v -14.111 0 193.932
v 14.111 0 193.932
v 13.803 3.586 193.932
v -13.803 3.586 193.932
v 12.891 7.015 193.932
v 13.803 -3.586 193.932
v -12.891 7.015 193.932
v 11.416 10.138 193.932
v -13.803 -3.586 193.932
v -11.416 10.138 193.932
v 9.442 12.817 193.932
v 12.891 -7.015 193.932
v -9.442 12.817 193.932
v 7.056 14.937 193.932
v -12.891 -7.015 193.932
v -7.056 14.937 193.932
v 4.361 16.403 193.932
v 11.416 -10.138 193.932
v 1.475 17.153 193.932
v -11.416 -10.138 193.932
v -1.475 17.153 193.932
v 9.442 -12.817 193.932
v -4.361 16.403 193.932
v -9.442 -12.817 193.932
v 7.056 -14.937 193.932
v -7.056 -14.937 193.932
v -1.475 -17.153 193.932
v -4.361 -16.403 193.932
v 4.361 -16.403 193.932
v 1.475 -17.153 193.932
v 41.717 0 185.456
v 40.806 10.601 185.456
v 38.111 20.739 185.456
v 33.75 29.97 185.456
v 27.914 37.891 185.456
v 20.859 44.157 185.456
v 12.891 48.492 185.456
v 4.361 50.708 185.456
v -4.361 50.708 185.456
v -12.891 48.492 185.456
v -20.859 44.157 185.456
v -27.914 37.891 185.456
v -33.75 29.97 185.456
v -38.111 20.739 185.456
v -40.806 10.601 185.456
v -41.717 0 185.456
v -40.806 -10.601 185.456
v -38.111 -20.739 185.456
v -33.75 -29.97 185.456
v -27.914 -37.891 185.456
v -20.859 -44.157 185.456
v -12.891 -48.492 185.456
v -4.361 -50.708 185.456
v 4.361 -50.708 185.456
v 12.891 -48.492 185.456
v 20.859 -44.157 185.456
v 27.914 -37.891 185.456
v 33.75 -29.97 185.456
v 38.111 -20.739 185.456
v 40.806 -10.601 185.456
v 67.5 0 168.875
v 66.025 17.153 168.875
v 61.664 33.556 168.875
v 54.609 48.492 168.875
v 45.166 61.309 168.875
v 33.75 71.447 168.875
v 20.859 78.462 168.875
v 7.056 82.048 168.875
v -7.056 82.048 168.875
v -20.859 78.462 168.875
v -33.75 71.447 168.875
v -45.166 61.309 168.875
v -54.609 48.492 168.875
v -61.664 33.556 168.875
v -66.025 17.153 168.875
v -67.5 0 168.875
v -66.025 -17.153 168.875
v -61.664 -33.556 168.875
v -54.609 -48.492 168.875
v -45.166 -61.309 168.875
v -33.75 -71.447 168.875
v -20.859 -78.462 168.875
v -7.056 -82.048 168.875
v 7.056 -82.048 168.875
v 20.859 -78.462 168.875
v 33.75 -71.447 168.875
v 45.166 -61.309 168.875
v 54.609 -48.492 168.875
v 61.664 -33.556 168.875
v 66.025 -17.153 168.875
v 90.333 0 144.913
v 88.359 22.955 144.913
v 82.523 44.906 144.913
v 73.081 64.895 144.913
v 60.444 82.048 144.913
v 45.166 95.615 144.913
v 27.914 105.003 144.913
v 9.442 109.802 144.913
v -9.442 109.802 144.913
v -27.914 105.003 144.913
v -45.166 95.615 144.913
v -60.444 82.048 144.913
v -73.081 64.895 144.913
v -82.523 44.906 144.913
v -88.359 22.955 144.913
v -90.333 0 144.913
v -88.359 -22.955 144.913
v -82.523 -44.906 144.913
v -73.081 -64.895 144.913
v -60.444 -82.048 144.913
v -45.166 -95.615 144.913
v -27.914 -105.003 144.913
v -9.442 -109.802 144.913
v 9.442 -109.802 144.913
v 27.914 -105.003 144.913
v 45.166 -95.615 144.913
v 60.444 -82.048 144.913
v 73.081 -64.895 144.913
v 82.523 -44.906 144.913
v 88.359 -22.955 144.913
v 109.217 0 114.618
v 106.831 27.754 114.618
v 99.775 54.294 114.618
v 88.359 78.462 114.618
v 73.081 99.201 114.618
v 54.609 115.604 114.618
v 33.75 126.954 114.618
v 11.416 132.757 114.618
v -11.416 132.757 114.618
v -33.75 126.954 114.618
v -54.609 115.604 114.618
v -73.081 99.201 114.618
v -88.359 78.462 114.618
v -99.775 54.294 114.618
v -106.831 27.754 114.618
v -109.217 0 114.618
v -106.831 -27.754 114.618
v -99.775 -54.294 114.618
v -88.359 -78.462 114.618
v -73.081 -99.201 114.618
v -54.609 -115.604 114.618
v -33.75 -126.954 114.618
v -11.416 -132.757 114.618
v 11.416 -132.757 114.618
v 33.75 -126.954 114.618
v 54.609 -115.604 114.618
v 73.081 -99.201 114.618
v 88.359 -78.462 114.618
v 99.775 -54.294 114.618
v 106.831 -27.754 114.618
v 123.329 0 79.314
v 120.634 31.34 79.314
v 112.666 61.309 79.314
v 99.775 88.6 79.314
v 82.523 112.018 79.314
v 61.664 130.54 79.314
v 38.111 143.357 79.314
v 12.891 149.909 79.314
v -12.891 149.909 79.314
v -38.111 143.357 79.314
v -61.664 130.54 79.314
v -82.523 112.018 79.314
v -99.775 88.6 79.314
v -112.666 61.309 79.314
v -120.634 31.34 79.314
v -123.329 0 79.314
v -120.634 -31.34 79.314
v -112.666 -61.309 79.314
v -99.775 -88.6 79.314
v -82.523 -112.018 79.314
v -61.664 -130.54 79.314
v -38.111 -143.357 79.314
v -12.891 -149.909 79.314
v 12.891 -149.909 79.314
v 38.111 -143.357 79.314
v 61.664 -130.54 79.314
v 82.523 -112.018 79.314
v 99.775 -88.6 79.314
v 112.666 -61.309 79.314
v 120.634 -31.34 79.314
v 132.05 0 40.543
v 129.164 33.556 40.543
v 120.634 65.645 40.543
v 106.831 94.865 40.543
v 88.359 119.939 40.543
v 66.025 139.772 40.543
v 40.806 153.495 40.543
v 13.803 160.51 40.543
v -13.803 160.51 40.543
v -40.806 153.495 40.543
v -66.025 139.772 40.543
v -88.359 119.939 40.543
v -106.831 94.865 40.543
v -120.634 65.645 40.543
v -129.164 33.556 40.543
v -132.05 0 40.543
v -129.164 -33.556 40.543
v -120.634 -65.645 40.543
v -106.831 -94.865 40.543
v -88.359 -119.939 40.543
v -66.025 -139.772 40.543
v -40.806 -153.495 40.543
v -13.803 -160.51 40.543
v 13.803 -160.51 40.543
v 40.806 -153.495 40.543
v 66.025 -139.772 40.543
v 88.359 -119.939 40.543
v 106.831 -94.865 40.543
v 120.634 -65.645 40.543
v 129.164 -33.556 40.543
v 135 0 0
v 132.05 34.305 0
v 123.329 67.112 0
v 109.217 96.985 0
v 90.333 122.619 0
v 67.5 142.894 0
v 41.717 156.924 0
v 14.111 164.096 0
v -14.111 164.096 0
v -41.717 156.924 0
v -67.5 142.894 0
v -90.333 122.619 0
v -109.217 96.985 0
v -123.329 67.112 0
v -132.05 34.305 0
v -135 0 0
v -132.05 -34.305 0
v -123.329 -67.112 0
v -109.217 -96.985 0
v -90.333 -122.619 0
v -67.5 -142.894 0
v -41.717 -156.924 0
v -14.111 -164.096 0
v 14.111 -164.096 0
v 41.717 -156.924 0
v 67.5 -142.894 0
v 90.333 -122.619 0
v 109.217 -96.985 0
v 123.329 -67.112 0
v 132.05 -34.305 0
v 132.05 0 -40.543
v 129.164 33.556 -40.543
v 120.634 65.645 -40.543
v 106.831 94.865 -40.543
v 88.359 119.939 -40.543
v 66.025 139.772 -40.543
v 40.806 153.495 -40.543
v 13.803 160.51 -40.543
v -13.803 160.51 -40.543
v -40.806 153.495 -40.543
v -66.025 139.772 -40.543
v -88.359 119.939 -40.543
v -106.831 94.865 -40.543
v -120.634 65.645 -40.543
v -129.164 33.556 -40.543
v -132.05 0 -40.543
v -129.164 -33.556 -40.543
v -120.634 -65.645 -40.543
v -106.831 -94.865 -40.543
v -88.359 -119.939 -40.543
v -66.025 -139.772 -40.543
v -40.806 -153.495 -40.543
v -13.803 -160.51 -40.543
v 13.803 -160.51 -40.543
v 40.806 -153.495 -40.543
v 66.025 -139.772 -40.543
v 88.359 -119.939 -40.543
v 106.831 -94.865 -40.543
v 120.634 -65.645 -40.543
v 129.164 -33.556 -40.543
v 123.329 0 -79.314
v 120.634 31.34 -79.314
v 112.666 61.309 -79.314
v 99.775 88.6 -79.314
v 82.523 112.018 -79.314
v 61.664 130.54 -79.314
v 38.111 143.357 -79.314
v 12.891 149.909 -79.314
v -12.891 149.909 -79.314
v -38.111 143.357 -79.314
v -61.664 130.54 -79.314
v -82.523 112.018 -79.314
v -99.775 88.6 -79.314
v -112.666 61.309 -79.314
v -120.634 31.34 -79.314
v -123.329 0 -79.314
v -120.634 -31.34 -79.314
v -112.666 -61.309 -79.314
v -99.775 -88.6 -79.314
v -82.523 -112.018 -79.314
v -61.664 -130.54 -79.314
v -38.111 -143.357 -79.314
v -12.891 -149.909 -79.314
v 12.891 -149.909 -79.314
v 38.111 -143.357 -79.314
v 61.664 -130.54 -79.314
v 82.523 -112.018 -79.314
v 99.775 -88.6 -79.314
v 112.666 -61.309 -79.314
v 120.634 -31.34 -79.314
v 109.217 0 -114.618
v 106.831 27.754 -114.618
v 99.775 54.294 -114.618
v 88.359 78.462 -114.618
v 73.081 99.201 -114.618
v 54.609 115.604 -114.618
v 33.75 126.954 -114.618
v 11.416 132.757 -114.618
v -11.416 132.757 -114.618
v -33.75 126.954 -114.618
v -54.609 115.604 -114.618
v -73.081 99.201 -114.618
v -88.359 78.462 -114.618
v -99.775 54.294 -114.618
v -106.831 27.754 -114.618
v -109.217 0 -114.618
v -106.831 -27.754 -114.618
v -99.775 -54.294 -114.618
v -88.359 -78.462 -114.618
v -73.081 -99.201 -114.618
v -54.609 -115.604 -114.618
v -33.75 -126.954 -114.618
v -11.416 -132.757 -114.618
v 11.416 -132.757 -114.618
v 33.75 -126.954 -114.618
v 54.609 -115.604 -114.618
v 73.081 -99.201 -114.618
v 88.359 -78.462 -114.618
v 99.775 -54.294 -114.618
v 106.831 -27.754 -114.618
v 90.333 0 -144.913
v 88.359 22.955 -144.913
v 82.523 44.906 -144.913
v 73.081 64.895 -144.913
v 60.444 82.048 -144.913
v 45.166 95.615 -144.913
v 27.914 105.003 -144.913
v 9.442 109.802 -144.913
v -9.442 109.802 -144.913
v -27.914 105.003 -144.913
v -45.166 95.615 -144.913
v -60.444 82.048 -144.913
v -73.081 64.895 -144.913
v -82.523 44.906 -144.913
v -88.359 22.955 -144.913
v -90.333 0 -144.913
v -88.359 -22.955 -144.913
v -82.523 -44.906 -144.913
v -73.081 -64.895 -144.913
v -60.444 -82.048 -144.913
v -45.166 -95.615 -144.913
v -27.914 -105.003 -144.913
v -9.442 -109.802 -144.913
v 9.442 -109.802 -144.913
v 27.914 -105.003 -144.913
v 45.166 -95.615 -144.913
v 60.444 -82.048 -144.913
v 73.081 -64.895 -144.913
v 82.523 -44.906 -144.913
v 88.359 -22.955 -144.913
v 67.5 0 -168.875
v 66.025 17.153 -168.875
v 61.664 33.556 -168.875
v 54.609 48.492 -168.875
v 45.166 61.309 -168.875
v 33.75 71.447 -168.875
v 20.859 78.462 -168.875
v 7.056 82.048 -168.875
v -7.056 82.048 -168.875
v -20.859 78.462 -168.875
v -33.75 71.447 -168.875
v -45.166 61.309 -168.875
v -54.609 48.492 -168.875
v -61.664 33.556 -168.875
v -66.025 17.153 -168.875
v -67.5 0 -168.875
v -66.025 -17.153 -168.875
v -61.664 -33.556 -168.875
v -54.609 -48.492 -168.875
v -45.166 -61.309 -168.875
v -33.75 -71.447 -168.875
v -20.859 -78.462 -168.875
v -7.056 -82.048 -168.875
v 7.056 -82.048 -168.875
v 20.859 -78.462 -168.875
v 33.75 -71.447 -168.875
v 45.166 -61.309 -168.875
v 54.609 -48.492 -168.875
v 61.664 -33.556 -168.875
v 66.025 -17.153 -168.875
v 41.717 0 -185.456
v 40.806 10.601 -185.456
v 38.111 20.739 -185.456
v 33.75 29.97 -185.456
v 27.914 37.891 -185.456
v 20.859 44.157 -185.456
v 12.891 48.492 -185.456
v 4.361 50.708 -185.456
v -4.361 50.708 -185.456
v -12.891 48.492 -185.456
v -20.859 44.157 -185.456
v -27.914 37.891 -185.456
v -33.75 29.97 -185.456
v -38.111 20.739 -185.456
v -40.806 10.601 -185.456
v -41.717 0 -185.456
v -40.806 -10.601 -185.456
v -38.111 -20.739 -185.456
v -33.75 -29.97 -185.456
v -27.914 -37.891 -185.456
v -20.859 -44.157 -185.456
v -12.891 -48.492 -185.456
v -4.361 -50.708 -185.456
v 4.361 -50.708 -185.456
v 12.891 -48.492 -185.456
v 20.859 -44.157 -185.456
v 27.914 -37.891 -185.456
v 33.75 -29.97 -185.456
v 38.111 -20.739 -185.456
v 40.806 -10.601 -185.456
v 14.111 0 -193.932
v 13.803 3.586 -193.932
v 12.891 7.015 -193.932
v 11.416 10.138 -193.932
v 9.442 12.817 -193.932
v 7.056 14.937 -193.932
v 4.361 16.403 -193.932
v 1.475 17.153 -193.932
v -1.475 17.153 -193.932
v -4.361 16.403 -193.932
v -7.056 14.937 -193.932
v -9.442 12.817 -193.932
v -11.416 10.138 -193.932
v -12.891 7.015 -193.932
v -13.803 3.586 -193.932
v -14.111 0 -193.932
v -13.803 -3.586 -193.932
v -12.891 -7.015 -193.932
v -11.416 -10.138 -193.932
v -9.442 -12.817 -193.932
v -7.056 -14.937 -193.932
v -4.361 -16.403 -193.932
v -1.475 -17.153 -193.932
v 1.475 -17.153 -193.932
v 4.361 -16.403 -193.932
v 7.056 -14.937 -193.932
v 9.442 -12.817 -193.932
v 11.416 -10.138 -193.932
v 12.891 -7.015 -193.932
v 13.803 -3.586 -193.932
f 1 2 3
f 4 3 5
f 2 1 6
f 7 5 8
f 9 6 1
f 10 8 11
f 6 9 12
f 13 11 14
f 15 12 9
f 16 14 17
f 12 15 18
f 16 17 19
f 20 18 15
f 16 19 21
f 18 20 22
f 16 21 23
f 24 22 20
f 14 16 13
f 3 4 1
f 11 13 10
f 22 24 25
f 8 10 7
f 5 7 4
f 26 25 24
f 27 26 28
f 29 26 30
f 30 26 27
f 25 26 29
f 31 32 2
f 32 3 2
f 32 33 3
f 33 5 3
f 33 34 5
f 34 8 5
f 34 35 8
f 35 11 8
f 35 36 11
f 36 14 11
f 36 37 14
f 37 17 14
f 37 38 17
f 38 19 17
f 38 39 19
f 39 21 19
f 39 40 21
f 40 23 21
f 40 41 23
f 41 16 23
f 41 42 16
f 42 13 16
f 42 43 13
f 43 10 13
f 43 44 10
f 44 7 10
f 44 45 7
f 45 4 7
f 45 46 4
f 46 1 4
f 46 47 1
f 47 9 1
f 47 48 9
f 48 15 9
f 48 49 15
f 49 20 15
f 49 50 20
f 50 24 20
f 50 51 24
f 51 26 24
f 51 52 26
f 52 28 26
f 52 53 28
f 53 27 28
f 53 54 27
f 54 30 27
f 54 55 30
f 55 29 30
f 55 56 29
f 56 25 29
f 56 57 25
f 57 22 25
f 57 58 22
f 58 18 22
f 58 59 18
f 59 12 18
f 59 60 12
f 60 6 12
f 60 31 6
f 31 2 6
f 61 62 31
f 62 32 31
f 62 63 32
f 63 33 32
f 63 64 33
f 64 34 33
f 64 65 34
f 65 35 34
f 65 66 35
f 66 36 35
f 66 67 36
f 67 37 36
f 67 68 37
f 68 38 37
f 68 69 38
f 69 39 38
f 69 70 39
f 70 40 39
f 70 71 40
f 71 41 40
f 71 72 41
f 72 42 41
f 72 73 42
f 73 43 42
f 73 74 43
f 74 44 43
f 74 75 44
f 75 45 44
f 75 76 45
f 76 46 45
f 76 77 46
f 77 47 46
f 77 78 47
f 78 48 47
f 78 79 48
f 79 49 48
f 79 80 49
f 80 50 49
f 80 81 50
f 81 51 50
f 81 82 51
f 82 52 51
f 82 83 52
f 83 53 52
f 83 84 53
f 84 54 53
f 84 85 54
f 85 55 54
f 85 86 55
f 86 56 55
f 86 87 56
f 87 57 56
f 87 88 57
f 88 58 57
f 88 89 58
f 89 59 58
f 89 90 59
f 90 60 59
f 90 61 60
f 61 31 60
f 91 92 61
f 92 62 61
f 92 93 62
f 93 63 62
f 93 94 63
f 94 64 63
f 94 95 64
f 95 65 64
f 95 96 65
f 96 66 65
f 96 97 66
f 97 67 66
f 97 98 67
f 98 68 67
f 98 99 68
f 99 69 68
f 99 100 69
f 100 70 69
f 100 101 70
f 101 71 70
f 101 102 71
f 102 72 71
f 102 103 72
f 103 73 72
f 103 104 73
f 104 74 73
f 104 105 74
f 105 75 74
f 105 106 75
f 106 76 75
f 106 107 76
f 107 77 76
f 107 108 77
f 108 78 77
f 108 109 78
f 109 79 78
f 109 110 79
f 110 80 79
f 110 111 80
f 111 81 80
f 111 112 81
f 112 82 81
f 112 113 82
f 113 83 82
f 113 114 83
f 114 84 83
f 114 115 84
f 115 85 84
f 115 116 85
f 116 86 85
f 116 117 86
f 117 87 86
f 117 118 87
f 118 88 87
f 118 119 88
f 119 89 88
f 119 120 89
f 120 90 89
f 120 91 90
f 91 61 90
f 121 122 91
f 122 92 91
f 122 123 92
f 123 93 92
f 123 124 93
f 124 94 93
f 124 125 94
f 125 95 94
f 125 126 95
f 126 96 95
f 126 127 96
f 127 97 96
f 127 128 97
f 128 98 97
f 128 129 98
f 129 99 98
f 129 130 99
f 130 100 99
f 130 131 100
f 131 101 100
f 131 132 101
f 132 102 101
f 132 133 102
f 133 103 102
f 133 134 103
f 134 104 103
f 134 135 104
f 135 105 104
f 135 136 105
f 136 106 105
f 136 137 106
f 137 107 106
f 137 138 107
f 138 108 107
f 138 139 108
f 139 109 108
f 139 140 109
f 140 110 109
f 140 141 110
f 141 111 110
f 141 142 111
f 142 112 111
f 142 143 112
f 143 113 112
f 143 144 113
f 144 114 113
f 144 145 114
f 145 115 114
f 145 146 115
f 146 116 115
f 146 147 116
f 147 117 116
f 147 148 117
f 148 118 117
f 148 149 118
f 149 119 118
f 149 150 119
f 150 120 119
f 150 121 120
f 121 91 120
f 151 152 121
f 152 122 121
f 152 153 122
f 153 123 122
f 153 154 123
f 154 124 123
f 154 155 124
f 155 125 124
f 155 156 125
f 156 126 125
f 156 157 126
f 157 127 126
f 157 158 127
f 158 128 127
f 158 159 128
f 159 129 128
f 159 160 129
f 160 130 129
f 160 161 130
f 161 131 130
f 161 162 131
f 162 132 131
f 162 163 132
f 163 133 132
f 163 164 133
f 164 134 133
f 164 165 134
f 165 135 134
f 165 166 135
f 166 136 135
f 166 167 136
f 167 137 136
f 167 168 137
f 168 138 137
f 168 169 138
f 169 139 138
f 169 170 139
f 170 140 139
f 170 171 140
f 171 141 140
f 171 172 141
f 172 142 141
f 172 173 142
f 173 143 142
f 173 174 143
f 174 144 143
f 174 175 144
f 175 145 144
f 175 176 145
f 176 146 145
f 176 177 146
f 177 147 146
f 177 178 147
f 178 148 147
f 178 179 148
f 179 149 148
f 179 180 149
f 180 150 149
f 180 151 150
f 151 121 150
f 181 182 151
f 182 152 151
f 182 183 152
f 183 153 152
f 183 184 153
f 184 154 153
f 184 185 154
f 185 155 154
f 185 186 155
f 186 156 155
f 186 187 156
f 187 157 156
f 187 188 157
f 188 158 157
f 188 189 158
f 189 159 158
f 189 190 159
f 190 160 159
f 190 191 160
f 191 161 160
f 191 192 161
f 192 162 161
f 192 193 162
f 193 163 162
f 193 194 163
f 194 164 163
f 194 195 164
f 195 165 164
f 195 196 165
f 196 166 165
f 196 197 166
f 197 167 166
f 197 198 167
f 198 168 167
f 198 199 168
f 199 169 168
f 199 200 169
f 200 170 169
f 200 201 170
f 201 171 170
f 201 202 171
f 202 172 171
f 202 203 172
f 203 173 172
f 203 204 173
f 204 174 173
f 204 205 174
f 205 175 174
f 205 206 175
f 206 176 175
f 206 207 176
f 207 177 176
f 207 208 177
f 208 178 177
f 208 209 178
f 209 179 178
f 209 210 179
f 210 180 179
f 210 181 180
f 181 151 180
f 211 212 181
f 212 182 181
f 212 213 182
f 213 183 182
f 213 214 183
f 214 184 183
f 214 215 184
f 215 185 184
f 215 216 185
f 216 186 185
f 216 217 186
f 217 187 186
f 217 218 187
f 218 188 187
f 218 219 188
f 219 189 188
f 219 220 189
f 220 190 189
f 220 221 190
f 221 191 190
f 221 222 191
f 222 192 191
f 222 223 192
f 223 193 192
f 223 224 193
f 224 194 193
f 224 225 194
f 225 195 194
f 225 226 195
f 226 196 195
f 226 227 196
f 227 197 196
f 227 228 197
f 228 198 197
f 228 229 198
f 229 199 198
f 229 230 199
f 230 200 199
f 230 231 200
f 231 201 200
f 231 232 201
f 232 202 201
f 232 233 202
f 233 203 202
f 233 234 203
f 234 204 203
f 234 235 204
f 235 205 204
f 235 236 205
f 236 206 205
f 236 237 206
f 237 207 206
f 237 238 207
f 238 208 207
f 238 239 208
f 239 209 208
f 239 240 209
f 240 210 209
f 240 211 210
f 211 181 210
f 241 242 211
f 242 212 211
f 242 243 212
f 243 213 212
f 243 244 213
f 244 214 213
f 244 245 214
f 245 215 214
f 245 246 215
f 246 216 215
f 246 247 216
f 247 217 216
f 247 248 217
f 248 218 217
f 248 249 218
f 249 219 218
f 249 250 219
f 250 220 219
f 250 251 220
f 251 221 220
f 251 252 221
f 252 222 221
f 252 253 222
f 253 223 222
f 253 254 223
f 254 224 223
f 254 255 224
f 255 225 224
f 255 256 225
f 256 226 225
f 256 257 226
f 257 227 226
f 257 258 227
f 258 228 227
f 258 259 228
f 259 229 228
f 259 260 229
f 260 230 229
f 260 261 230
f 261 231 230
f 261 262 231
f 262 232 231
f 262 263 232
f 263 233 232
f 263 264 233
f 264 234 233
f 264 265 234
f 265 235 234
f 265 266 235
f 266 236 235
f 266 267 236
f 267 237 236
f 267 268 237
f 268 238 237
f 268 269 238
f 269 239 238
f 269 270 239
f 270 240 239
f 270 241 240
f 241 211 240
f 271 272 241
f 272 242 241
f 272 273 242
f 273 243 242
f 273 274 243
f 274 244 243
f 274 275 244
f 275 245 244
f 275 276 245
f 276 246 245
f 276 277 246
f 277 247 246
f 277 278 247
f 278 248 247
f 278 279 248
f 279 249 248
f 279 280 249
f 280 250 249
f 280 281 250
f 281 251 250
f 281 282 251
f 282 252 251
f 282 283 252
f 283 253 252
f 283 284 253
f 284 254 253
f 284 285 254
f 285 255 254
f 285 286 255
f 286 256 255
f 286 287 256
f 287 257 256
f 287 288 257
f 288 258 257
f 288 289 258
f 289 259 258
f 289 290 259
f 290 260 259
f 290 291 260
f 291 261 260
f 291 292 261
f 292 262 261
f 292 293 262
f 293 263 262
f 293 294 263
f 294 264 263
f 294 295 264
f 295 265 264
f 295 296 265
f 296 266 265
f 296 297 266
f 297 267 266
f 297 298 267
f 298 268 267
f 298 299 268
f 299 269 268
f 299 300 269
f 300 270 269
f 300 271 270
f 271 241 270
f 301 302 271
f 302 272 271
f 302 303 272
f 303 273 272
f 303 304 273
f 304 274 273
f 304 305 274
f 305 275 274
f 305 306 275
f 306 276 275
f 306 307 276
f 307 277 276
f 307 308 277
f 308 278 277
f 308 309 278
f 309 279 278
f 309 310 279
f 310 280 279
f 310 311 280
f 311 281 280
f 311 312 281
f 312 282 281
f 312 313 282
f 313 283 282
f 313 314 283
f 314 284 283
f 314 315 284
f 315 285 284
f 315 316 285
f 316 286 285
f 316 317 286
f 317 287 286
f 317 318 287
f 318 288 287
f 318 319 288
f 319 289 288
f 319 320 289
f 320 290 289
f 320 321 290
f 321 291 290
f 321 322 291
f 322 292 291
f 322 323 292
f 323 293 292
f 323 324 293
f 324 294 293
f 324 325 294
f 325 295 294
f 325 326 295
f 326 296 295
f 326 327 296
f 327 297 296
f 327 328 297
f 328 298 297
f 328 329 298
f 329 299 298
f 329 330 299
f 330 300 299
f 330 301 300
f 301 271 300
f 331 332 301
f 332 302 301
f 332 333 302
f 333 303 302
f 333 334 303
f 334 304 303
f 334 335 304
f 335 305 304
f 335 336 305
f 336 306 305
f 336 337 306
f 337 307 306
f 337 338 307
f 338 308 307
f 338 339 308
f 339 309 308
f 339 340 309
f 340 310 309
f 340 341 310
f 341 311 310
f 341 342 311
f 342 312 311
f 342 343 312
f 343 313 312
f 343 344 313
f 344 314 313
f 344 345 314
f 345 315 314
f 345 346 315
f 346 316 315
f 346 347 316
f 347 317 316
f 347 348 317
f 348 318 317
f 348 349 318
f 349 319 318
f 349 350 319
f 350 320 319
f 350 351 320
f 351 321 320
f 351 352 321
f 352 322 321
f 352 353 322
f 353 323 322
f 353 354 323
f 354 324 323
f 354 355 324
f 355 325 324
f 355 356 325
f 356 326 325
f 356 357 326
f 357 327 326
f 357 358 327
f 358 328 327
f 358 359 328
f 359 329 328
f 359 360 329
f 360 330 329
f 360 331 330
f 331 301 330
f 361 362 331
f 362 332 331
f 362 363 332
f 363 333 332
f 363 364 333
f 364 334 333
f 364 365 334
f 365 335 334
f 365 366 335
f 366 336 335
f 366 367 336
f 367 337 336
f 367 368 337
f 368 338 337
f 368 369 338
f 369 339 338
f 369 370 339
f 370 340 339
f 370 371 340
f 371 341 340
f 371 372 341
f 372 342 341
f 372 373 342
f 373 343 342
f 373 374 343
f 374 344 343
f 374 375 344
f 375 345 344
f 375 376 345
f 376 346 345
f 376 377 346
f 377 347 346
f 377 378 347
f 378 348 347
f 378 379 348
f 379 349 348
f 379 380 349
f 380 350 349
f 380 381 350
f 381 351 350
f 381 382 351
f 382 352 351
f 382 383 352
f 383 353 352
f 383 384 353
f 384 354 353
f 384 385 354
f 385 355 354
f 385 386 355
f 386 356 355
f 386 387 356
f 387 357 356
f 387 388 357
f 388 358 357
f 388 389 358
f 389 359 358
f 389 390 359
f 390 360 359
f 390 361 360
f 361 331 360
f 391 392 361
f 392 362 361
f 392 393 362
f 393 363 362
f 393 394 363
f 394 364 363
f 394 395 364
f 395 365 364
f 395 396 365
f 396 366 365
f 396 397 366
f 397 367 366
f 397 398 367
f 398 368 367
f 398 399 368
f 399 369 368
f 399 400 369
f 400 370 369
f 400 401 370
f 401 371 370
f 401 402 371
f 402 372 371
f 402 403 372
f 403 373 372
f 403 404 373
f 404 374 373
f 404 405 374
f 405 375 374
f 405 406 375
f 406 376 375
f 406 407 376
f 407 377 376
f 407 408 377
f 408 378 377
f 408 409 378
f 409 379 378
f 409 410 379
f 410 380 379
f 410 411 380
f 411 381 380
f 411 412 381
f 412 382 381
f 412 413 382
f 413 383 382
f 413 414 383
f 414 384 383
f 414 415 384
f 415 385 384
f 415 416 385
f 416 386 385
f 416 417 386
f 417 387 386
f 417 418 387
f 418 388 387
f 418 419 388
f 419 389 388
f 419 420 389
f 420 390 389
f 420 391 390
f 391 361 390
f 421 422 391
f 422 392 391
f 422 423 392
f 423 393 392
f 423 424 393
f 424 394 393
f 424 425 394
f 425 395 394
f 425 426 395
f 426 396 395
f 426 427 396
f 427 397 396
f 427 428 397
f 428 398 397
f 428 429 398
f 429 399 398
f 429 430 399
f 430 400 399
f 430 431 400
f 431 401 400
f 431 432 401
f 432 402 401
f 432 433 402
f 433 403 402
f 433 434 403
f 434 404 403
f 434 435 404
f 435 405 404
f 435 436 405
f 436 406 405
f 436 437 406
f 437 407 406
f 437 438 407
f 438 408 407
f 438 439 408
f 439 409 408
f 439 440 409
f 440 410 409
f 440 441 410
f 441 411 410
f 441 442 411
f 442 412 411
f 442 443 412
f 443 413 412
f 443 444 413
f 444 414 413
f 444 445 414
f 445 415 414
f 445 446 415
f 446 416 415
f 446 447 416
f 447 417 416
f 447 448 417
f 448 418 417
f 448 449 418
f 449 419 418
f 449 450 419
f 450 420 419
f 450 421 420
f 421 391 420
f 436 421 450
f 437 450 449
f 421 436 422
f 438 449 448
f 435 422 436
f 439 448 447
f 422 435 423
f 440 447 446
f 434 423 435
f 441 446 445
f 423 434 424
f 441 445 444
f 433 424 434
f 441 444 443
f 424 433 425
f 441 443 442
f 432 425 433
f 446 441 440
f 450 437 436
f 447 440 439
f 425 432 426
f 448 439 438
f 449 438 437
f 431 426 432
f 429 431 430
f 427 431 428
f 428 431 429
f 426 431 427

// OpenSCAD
// Generated by SolidPython 1.0.1 on 2020-07-29 00:46:48


scale(v = [9, 11, 13]) {
	sphere(r = 15);
}
/***********************************************
*********      SolidPython code:      **********
************************************************
 
# import packages: SolidPython
from solid import *
from solid.utils import *
from itertools import chain, combinations, permutations


class Resize:

    def __init__(self, scad_file):
        self.scad_file = scad_file
        #self.scad_file = import_scad(scad_file)
        # cone/cylinder param:
        self.r1 = 0
        self.r2 = 0
        self.h = 0
        # rectangular prism param:
        self.w = 0
        self.l = 0
        # ellipse param:
        self.r = 0

    # import OpenScad code (file name corresponds to shape)


    # classify shape + parameters
    def assign(self, param1, param2, param3):
        if self.scad_file == 'cone.scad':
            self.r1 = param1
            self.r2 = param2
            self.h = param3
        elif self.scad_file == 'cylinder.scad':
            self.r1 = param1
            self.r2 = param2
            self.h = param3
        elif self.scad_file == 'rectangularPrism.scad':
            self.h = param1
            self.l = param2
            self.w = param3
        else:
            self.r = param1
            self.h = param2

    # resize parameters
    def iterate(self):
        x = range(3, 20, 2)
        i = 1
        if self.scad_file == 'cone.scad':
            tempList = list(permutations(x, 2))
            for temp in tempList:
                param1 = temp[0]
                param2 = temp[1]
                filepath = 'produced_scad_files/' + 'cone' + str(param1) + '_' + str(param2) + '_' + '.scad'
                scad_render_to_file(cylinder(h=param1, r1=param2, r2=0), filepath)

        elif self.scad_file == 'cylinder.scad':
            tempList = list(permutations(x, 3))
            for temp in tempList:
                param1 = temp[0]
                param2 = temp[1]
                filepath = 'produced_scad_files/' + 'cylinder' + str(param1) + '_' + str(param2) + '_' + '.scad'
                scad_render_to_file(cylinder(h=param1, r1=param2, r2=param2), filepath)

        elif self.scad_file == 'rectangularPrism.scad':
            tempList = list(permutations(x, 3))
            for temp in tempList:
                param1 = temp[0]
                param2 = temp[1]
                param3 = temp[2]
                filepath = 'produced_scad_files/' + 'rectangularPrism' + str(param1) + '_' + str(param2) + '_' + str(
                    param3) + '.scad'
                scad_render_to_file(cube(size=(param1, param2, param3)), filepath)

        elif self.scad_file == 'ellipse.scad':
            tempList = list(permutations(x, 4))
            for temp in tempList:
                param1 = temp[0]
                param2 = temp[1]
                param3 = temp[2]
                param4 = temp[3]
                filepath = 'produced_scad_files/' + 'ellipse' + str(param1) + '_' + str(param2) + '_' + str(param3) + '_' + str(param4) + '.scad'
                scad_render_to_file(scale([param1, param2, param3])(sphere(r=param4)), filepath)

    def render_to_scadfile(self):
        scad_render_to_file(scad, 'example.scad') 
 
************************************************/
